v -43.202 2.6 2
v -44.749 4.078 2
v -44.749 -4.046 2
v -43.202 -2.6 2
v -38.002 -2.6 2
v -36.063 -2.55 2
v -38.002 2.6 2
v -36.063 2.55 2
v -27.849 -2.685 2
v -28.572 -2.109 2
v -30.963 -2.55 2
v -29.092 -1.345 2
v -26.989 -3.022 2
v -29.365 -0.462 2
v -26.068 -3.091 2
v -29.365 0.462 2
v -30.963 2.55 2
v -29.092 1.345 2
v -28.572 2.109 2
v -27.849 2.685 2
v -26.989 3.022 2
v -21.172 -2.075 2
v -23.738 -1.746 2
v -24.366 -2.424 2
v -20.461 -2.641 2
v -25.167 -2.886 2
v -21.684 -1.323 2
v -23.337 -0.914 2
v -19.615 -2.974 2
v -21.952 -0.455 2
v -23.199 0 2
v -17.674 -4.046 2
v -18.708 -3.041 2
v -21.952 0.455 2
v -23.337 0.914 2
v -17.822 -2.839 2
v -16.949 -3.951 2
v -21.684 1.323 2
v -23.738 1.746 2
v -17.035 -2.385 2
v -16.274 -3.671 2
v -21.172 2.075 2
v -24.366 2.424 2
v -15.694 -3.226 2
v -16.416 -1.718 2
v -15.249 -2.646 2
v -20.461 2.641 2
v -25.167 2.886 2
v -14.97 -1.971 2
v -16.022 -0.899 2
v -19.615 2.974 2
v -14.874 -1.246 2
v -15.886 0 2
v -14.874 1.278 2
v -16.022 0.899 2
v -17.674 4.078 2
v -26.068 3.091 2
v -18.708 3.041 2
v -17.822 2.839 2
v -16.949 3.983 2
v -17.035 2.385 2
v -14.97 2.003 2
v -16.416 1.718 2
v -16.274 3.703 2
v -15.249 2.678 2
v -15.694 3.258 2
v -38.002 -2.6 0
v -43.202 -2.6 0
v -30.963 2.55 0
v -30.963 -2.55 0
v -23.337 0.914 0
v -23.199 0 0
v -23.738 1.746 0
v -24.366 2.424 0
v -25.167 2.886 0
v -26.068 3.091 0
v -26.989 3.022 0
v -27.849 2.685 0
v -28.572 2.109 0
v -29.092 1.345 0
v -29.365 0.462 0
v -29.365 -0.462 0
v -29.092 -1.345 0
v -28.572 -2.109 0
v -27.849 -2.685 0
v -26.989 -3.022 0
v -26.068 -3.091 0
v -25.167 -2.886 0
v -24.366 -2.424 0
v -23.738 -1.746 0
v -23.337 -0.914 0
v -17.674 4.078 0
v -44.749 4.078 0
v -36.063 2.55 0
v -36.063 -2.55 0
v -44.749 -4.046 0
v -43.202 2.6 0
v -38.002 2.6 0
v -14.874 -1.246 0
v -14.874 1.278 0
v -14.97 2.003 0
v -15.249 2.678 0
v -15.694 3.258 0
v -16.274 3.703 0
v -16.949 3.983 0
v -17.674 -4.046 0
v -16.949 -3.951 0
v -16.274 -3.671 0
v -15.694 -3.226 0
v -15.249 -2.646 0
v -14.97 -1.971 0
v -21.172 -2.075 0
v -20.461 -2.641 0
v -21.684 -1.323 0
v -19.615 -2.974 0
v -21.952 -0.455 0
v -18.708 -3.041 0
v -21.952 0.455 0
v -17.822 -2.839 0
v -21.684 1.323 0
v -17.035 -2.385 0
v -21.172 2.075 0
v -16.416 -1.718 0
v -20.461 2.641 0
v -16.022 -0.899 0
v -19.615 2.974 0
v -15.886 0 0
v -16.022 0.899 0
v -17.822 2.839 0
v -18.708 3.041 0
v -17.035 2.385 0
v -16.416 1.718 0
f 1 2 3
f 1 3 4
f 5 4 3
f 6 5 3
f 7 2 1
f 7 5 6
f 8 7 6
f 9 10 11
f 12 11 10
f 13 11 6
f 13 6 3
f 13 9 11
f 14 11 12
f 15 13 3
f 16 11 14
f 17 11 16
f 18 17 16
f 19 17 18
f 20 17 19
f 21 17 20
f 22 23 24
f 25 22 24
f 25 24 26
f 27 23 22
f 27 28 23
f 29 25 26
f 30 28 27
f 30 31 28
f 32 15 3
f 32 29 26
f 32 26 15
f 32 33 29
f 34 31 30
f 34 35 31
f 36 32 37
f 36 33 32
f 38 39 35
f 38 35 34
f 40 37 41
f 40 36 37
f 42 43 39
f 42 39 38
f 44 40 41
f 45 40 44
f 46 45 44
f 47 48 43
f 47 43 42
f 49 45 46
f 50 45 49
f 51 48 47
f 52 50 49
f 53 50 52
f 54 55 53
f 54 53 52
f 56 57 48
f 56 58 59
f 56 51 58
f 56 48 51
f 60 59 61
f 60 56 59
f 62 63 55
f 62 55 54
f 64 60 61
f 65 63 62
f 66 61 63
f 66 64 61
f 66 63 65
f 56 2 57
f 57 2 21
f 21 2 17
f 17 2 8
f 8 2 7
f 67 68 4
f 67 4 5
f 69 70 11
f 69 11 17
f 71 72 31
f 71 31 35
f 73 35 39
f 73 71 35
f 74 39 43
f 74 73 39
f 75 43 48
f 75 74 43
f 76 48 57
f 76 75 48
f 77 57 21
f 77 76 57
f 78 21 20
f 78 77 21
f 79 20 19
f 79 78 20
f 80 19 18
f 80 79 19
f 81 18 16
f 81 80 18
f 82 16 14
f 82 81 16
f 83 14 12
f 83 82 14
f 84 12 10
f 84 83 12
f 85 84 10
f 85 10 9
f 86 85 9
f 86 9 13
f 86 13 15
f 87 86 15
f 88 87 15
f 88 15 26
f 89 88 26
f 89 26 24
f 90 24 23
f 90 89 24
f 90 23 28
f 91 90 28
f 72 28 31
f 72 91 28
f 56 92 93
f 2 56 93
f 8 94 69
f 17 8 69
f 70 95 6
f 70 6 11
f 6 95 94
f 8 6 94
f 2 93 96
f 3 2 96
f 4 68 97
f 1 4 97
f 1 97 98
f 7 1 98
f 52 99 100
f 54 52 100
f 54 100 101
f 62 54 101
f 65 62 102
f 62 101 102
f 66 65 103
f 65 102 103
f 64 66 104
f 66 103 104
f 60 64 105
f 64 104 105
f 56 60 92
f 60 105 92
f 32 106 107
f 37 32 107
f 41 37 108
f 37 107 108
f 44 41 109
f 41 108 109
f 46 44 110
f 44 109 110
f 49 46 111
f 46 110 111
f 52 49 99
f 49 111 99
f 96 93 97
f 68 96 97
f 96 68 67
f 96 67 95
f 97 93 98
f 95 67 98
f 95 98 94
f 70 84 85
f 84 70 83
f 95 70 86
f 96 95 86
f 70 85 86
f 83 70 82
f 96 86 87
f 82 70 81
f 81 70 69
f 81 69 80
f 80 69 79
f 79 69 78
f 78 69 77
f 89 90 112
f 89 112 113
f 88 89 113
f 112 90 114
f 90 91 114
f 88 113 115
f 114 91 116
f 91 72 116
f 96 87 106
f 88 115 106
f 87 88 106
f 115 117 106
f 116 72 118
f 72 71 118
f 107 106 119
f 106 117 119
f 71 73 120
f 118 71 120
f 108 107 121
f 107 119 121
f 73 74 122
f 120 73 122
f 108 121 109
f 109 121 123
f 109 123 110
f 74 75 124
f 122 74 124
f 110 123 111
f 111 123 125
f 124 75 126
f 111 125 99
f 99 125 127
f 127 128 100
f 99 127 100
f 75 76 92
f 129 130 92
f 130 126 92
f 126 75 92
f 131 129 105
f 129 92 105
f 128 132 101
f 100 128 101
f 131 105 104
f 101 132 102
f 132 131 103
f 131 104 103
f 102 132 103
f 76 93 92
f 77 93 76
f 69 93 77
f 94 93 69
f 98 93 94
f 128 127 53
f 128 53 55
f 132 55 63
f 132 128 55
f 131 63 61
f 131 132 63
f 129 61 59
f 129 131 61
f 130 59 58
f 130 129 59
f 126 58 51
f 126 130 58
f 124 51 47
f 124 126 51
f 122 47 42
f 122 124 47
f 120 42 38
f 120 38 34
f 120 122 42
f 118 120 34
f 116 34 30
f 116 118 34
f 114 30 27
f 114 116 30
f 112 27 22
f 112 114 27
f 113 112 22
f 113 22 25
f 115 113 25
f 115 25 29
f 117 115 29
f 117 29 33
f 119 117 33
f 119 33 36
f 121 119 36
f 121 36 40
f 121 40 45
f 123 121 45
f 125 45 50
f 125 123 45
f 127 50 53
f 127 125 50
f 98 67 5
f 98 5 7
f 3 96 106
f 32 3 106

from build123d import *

# Parameters (mm, degrees)
F0_W     = 5.2
F0_H     = 5.2
F0_W_2   = 5.1
F0_H_2   = 5.1
F0_R     = 3.1
F0_R_2   = 3.05
F1_DEPTH = 2


with BuildPart() as f1:
    # F0 (on Top) → F1 (new body)
    with BuildSketch(Plane.XY):
        with BuildLine():
            Line((-17.674136, 4.078372), (-44.748526, 4.078372))
            Line((-44.748526, 4.078372), (-44.748526, -4.046109))
            Line((-44.748526, -4.046109), (-17.674136, -4.046109))
            ThreePointArc((-17.674136, -4.046109), (-15.694237, -3.226008), (-14.874136, -1.246109))
            Line((-14.874136, -1.246109), (-14.874136, 1.278372))
            ThreePointArc((-14.874136, 1.278372), (-15.694237, 3.258271), (-17.674136, 4.078372))
        make_face()
        with Locations((-40.60166, 0)):
            Rectangle(F0_W, F0_H, mode=Mode.SUBTRACT)
        with Locations((-33.513274, 0)):
            Rectangle(F0_W_2, F0_H_2, mode=Mode.SUBTRACT)
        with Locations((-26.299188, 0)):
            Circle(F0_R, mode=Mode.SUBTRACT)
        with Locations((-18.936377, 0)):
            Circle(F0_R_2, mode=Mode.SUBTRACT)
    extrude(amount=F1_DEPTH)


solid = f1.part
